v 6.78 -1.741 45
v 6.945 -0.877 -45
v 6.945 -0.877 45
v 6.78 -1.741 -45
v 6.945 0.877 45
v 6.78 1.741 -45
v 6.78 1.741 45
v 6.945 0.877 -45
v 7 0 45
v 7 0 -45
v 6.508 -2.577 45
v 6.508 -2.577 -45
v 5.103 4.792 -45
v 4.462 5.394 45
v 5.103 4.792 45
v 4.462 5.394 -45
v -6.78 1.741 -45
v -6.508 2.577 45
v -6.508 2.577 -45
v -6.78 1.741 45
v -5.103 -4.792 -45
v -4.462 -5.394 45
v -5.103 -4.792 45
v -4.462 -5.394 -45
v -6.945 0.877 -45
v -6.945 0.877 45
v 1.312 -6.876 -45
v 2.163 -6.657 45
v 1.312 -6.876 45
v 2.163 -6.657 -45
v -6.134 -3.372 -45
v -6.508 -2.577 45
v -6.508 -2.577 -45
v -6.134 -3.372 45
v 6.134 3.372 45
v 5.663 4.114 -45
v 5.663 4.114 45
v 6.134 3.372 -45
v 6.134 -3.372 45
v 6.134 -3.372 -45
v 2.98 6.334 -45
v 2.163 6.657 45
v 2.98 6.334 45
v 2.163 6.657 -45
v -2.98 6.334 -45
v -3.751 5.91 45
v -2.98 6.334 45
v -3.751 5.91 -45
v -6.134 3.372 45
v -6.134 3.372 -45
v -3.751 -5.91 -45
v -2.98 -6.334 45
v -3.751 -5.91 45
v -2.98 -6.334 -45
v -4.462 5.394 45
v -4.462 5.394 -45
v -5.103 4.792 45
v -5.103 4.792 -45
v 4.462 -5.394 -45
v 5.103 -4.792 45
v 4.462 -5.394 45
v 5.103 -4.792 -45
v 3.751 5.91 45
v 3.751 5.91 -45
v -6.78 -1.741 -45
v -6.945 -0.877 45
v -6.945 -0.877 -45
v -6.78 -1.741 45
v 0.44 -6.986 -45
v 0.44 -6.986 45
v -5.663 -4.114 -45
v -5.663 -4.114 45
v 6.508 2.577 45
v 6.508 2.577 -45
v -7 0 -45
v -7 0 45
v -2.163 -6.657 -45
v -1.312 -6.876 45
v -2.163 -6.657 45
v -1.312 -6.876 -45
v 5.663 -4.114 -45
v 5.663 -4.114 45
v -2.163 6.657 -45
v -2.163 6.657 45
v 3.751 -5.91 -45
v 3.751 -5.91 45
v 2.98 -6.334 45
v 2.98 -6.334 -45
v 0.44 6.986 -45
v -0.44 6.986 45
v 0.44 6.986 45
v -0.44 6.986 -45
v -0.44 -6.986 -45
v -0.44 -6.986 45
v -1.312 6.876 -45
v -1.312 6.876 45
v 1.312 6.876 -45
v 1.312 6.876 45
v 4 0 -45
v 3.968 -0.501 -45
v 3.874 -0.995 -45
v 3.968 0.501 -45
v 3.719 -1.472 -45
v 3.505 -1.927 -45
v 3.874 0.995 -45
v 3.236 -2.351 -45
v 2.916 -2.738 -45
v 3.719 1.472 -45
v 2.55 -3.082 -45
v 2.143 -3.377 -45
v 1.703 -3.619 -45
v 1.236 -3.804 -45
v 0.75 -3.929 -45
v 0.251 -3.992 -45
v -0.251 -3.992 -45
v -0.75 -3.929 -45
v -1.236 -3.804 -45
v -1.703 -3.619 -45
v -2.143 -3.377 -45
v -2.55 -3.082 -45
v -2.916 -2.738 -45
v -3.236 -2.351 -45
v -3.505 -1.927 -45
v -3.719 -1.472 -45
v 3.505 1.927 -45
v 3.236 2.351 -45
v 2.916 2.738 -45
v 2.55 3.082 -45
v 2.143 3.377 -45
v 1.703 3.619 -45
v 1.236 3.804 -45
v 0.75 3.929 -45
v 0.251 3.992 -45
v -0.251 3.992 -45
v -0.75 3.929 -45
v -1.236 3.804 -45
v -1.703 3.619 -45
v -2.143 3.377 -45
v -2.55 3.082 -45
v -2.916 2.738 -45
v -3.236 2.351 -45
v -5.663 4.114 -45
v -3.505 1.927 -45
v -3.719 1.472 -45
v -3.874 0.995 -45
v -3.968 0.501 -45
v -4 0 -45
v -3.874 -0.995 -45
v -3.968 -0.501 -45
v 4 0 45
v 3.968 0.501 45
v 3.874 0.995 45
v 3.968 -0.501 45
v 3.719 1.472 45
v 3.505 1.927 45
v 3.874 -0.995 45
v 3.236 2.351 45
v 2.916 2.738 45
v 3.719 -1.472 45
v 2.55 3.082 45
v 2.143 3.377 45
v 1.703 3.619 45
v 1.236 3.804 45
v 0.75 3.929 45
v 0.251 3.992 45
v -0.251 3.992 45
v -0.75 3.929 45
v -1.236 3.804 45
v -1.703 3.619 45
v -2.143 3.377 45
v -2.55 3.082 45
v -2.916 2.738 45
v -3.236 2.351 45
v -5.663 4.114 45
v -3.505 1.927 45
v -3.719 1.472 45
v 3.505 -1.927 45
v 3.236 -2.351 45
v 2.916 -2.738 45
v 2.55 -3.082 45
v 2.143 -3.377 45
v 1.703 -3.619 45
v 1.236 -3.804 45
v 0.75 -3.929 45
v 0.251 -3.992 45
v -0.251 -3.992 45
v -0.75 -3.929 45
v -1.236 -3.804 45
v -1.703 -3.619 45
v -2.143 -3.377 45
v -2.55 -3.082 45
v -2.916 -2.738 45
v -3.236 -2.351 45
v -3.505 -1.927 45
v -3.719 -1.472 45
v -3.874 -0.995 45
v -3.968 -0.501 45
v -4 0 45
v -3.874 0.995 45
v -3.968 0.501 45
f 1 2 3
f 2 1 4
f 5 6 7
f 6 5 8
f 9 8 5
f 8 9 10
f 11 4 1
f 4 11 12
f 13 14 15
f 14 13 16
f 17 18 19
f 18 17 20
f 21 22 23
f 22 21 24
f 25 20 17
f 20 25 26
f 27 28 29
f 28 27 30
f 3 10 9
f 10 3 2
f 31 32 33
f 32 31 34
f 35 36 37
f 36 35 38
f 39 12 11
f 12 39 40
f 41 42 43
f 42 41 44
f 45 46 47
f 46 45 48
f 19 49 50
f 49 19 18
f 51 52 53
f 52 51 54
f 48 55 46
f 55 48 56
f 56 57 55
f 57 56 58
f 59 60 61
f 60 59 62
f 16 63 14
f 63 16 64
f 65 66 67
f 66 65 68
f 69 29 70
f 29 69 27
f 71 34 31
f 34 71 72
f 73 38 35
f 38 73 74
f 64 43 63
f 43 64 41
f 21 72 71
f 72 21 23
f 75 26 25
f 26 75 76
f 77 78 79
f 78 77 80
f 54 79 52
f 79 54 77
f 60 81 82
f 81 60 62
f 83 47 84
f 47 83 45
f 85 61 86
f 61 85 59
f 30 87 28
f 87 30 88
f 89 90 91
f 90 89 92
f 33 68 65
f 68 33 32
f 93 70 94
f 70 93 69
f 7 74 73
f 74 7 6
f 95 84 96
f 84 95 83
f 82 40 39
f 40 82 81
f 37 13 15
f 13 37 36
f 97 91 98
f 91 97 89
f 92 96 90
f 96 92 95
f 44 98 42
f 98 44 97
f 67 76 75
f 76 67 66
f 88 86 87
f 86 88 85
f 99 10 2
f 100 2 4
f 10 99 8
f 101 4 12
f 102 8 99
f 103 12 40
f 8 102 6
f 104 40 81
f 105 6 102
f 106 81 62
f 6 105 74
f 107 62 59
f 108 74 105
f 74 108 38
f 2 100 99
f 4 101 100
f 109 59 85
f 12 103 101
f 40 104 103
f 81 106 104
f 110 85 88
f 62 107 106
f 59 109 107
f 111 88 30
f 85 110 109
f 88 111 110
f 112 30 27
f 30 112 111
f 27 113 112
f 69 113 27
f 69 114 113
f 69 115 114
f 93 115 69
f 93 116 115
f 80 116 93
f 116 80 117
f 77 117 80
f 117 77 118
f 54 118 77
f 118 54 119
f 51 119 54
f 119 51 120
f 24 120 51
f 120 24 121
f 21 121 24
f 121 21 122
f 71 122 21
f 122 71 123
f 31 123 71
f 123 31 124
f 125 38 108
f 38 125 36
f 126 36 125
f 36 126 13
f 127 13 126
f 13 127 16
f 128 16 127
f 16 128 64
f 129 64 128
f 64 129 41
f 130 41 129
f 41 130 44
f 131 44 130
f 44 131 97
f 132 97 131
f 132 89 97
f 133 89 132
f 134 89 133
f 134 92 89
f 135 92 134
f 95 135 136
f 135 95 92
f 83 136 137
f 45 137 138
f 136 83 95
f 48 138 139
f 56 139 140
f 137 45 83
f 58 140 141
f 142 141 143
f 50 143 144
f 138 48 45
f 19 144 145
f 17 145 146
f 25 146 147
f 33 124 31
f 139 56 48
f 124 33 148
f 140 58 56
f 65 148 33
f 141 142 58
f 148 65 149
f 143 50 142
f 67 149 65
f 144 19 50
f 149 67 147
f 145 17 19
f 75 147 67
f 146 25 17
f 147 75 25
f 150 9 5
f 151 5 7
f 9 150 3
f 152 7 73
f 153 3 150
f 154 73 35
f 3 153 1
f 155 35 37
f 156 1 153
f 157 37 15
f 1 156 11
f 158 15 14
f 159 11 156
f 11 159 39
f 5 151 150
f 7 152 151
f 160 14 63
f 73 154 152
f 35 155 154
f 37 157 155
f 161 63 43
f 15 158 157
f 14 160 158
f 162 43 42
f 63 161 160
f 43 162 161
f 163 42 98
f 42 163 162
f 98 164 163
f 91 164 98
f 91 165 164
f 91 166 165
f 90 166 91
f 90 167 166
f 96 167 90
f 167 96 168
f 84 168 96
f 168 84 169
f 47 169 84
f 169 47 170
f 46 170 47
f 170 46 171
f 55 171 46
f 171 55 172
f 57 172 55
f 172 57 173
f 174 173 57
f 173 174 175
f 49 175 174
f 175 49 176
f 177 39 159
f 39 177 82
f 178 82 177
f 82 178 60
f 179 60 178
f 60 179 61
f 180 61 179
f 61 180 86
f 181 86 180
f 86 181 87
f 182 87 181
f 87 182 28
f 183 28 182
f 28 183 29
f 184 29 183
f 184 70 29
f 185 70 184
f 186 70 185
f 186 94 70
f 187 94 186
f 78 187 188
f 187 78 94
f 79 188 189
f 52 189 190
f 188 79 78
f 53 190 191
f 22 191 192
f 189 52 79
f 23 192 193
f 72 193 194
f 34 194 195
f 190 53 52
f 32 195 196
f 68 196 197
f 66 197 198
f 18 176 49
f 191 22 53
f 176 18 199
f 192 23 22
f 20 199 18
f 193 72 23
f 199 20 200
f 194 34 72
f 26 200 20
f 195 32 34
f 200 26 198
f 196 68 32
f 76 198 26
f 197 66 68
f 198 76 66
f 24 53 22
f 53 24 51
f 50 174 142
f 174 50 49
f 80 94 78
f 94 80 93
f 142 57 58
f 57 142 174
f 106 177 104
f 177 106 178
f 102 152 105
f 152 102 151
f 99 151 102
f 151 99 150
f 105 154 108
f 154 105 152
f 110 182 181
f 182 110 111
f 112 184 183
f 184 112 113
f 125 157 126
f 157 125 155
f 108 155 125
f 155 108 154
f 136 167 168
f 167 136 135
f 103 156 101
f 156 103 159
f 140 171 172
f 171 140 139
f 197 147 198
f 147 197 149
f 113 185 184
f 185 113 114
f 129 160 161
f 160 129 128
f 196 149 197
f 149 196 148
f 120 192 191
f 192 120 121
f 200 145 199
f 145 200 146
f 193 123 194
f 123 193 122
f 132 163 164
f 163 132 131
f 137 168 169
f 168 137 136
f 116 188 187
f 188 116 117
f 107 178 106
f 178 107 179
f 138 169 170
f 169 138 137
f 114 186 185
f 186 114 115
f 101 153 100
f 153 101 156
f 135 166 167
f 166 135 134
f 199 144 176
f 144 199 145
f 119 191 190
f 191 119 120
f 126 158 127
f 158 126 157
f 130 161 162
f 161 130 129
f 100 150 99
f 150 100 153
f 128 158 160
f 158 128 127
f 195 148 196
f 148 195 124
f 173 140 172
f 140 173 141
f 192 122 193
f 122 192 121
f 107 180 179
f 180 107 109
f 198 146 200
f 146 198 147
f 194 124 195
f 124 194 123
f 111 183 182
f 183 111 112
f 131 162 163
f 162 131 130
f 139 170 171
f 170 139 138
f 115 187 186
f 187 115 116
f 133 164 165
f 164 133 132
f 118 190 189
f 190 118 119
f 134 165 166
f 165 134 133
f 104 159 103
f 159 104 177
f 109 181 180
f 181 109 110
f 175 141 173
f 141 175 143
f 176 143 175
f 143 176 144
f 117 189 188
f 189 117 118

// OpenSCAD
$fn = 50;


difference() {
	union() {
		translate(v = [0, 0, -45.0000000000]) {
			cylinder(h = 90, r = 7.0000000000);
		}
	}
	union() {
		translate(v = [0, 0, -100.0000000000]) {
			cylinder(h = 200, r = 4.0000000000);
		}
	}
}
